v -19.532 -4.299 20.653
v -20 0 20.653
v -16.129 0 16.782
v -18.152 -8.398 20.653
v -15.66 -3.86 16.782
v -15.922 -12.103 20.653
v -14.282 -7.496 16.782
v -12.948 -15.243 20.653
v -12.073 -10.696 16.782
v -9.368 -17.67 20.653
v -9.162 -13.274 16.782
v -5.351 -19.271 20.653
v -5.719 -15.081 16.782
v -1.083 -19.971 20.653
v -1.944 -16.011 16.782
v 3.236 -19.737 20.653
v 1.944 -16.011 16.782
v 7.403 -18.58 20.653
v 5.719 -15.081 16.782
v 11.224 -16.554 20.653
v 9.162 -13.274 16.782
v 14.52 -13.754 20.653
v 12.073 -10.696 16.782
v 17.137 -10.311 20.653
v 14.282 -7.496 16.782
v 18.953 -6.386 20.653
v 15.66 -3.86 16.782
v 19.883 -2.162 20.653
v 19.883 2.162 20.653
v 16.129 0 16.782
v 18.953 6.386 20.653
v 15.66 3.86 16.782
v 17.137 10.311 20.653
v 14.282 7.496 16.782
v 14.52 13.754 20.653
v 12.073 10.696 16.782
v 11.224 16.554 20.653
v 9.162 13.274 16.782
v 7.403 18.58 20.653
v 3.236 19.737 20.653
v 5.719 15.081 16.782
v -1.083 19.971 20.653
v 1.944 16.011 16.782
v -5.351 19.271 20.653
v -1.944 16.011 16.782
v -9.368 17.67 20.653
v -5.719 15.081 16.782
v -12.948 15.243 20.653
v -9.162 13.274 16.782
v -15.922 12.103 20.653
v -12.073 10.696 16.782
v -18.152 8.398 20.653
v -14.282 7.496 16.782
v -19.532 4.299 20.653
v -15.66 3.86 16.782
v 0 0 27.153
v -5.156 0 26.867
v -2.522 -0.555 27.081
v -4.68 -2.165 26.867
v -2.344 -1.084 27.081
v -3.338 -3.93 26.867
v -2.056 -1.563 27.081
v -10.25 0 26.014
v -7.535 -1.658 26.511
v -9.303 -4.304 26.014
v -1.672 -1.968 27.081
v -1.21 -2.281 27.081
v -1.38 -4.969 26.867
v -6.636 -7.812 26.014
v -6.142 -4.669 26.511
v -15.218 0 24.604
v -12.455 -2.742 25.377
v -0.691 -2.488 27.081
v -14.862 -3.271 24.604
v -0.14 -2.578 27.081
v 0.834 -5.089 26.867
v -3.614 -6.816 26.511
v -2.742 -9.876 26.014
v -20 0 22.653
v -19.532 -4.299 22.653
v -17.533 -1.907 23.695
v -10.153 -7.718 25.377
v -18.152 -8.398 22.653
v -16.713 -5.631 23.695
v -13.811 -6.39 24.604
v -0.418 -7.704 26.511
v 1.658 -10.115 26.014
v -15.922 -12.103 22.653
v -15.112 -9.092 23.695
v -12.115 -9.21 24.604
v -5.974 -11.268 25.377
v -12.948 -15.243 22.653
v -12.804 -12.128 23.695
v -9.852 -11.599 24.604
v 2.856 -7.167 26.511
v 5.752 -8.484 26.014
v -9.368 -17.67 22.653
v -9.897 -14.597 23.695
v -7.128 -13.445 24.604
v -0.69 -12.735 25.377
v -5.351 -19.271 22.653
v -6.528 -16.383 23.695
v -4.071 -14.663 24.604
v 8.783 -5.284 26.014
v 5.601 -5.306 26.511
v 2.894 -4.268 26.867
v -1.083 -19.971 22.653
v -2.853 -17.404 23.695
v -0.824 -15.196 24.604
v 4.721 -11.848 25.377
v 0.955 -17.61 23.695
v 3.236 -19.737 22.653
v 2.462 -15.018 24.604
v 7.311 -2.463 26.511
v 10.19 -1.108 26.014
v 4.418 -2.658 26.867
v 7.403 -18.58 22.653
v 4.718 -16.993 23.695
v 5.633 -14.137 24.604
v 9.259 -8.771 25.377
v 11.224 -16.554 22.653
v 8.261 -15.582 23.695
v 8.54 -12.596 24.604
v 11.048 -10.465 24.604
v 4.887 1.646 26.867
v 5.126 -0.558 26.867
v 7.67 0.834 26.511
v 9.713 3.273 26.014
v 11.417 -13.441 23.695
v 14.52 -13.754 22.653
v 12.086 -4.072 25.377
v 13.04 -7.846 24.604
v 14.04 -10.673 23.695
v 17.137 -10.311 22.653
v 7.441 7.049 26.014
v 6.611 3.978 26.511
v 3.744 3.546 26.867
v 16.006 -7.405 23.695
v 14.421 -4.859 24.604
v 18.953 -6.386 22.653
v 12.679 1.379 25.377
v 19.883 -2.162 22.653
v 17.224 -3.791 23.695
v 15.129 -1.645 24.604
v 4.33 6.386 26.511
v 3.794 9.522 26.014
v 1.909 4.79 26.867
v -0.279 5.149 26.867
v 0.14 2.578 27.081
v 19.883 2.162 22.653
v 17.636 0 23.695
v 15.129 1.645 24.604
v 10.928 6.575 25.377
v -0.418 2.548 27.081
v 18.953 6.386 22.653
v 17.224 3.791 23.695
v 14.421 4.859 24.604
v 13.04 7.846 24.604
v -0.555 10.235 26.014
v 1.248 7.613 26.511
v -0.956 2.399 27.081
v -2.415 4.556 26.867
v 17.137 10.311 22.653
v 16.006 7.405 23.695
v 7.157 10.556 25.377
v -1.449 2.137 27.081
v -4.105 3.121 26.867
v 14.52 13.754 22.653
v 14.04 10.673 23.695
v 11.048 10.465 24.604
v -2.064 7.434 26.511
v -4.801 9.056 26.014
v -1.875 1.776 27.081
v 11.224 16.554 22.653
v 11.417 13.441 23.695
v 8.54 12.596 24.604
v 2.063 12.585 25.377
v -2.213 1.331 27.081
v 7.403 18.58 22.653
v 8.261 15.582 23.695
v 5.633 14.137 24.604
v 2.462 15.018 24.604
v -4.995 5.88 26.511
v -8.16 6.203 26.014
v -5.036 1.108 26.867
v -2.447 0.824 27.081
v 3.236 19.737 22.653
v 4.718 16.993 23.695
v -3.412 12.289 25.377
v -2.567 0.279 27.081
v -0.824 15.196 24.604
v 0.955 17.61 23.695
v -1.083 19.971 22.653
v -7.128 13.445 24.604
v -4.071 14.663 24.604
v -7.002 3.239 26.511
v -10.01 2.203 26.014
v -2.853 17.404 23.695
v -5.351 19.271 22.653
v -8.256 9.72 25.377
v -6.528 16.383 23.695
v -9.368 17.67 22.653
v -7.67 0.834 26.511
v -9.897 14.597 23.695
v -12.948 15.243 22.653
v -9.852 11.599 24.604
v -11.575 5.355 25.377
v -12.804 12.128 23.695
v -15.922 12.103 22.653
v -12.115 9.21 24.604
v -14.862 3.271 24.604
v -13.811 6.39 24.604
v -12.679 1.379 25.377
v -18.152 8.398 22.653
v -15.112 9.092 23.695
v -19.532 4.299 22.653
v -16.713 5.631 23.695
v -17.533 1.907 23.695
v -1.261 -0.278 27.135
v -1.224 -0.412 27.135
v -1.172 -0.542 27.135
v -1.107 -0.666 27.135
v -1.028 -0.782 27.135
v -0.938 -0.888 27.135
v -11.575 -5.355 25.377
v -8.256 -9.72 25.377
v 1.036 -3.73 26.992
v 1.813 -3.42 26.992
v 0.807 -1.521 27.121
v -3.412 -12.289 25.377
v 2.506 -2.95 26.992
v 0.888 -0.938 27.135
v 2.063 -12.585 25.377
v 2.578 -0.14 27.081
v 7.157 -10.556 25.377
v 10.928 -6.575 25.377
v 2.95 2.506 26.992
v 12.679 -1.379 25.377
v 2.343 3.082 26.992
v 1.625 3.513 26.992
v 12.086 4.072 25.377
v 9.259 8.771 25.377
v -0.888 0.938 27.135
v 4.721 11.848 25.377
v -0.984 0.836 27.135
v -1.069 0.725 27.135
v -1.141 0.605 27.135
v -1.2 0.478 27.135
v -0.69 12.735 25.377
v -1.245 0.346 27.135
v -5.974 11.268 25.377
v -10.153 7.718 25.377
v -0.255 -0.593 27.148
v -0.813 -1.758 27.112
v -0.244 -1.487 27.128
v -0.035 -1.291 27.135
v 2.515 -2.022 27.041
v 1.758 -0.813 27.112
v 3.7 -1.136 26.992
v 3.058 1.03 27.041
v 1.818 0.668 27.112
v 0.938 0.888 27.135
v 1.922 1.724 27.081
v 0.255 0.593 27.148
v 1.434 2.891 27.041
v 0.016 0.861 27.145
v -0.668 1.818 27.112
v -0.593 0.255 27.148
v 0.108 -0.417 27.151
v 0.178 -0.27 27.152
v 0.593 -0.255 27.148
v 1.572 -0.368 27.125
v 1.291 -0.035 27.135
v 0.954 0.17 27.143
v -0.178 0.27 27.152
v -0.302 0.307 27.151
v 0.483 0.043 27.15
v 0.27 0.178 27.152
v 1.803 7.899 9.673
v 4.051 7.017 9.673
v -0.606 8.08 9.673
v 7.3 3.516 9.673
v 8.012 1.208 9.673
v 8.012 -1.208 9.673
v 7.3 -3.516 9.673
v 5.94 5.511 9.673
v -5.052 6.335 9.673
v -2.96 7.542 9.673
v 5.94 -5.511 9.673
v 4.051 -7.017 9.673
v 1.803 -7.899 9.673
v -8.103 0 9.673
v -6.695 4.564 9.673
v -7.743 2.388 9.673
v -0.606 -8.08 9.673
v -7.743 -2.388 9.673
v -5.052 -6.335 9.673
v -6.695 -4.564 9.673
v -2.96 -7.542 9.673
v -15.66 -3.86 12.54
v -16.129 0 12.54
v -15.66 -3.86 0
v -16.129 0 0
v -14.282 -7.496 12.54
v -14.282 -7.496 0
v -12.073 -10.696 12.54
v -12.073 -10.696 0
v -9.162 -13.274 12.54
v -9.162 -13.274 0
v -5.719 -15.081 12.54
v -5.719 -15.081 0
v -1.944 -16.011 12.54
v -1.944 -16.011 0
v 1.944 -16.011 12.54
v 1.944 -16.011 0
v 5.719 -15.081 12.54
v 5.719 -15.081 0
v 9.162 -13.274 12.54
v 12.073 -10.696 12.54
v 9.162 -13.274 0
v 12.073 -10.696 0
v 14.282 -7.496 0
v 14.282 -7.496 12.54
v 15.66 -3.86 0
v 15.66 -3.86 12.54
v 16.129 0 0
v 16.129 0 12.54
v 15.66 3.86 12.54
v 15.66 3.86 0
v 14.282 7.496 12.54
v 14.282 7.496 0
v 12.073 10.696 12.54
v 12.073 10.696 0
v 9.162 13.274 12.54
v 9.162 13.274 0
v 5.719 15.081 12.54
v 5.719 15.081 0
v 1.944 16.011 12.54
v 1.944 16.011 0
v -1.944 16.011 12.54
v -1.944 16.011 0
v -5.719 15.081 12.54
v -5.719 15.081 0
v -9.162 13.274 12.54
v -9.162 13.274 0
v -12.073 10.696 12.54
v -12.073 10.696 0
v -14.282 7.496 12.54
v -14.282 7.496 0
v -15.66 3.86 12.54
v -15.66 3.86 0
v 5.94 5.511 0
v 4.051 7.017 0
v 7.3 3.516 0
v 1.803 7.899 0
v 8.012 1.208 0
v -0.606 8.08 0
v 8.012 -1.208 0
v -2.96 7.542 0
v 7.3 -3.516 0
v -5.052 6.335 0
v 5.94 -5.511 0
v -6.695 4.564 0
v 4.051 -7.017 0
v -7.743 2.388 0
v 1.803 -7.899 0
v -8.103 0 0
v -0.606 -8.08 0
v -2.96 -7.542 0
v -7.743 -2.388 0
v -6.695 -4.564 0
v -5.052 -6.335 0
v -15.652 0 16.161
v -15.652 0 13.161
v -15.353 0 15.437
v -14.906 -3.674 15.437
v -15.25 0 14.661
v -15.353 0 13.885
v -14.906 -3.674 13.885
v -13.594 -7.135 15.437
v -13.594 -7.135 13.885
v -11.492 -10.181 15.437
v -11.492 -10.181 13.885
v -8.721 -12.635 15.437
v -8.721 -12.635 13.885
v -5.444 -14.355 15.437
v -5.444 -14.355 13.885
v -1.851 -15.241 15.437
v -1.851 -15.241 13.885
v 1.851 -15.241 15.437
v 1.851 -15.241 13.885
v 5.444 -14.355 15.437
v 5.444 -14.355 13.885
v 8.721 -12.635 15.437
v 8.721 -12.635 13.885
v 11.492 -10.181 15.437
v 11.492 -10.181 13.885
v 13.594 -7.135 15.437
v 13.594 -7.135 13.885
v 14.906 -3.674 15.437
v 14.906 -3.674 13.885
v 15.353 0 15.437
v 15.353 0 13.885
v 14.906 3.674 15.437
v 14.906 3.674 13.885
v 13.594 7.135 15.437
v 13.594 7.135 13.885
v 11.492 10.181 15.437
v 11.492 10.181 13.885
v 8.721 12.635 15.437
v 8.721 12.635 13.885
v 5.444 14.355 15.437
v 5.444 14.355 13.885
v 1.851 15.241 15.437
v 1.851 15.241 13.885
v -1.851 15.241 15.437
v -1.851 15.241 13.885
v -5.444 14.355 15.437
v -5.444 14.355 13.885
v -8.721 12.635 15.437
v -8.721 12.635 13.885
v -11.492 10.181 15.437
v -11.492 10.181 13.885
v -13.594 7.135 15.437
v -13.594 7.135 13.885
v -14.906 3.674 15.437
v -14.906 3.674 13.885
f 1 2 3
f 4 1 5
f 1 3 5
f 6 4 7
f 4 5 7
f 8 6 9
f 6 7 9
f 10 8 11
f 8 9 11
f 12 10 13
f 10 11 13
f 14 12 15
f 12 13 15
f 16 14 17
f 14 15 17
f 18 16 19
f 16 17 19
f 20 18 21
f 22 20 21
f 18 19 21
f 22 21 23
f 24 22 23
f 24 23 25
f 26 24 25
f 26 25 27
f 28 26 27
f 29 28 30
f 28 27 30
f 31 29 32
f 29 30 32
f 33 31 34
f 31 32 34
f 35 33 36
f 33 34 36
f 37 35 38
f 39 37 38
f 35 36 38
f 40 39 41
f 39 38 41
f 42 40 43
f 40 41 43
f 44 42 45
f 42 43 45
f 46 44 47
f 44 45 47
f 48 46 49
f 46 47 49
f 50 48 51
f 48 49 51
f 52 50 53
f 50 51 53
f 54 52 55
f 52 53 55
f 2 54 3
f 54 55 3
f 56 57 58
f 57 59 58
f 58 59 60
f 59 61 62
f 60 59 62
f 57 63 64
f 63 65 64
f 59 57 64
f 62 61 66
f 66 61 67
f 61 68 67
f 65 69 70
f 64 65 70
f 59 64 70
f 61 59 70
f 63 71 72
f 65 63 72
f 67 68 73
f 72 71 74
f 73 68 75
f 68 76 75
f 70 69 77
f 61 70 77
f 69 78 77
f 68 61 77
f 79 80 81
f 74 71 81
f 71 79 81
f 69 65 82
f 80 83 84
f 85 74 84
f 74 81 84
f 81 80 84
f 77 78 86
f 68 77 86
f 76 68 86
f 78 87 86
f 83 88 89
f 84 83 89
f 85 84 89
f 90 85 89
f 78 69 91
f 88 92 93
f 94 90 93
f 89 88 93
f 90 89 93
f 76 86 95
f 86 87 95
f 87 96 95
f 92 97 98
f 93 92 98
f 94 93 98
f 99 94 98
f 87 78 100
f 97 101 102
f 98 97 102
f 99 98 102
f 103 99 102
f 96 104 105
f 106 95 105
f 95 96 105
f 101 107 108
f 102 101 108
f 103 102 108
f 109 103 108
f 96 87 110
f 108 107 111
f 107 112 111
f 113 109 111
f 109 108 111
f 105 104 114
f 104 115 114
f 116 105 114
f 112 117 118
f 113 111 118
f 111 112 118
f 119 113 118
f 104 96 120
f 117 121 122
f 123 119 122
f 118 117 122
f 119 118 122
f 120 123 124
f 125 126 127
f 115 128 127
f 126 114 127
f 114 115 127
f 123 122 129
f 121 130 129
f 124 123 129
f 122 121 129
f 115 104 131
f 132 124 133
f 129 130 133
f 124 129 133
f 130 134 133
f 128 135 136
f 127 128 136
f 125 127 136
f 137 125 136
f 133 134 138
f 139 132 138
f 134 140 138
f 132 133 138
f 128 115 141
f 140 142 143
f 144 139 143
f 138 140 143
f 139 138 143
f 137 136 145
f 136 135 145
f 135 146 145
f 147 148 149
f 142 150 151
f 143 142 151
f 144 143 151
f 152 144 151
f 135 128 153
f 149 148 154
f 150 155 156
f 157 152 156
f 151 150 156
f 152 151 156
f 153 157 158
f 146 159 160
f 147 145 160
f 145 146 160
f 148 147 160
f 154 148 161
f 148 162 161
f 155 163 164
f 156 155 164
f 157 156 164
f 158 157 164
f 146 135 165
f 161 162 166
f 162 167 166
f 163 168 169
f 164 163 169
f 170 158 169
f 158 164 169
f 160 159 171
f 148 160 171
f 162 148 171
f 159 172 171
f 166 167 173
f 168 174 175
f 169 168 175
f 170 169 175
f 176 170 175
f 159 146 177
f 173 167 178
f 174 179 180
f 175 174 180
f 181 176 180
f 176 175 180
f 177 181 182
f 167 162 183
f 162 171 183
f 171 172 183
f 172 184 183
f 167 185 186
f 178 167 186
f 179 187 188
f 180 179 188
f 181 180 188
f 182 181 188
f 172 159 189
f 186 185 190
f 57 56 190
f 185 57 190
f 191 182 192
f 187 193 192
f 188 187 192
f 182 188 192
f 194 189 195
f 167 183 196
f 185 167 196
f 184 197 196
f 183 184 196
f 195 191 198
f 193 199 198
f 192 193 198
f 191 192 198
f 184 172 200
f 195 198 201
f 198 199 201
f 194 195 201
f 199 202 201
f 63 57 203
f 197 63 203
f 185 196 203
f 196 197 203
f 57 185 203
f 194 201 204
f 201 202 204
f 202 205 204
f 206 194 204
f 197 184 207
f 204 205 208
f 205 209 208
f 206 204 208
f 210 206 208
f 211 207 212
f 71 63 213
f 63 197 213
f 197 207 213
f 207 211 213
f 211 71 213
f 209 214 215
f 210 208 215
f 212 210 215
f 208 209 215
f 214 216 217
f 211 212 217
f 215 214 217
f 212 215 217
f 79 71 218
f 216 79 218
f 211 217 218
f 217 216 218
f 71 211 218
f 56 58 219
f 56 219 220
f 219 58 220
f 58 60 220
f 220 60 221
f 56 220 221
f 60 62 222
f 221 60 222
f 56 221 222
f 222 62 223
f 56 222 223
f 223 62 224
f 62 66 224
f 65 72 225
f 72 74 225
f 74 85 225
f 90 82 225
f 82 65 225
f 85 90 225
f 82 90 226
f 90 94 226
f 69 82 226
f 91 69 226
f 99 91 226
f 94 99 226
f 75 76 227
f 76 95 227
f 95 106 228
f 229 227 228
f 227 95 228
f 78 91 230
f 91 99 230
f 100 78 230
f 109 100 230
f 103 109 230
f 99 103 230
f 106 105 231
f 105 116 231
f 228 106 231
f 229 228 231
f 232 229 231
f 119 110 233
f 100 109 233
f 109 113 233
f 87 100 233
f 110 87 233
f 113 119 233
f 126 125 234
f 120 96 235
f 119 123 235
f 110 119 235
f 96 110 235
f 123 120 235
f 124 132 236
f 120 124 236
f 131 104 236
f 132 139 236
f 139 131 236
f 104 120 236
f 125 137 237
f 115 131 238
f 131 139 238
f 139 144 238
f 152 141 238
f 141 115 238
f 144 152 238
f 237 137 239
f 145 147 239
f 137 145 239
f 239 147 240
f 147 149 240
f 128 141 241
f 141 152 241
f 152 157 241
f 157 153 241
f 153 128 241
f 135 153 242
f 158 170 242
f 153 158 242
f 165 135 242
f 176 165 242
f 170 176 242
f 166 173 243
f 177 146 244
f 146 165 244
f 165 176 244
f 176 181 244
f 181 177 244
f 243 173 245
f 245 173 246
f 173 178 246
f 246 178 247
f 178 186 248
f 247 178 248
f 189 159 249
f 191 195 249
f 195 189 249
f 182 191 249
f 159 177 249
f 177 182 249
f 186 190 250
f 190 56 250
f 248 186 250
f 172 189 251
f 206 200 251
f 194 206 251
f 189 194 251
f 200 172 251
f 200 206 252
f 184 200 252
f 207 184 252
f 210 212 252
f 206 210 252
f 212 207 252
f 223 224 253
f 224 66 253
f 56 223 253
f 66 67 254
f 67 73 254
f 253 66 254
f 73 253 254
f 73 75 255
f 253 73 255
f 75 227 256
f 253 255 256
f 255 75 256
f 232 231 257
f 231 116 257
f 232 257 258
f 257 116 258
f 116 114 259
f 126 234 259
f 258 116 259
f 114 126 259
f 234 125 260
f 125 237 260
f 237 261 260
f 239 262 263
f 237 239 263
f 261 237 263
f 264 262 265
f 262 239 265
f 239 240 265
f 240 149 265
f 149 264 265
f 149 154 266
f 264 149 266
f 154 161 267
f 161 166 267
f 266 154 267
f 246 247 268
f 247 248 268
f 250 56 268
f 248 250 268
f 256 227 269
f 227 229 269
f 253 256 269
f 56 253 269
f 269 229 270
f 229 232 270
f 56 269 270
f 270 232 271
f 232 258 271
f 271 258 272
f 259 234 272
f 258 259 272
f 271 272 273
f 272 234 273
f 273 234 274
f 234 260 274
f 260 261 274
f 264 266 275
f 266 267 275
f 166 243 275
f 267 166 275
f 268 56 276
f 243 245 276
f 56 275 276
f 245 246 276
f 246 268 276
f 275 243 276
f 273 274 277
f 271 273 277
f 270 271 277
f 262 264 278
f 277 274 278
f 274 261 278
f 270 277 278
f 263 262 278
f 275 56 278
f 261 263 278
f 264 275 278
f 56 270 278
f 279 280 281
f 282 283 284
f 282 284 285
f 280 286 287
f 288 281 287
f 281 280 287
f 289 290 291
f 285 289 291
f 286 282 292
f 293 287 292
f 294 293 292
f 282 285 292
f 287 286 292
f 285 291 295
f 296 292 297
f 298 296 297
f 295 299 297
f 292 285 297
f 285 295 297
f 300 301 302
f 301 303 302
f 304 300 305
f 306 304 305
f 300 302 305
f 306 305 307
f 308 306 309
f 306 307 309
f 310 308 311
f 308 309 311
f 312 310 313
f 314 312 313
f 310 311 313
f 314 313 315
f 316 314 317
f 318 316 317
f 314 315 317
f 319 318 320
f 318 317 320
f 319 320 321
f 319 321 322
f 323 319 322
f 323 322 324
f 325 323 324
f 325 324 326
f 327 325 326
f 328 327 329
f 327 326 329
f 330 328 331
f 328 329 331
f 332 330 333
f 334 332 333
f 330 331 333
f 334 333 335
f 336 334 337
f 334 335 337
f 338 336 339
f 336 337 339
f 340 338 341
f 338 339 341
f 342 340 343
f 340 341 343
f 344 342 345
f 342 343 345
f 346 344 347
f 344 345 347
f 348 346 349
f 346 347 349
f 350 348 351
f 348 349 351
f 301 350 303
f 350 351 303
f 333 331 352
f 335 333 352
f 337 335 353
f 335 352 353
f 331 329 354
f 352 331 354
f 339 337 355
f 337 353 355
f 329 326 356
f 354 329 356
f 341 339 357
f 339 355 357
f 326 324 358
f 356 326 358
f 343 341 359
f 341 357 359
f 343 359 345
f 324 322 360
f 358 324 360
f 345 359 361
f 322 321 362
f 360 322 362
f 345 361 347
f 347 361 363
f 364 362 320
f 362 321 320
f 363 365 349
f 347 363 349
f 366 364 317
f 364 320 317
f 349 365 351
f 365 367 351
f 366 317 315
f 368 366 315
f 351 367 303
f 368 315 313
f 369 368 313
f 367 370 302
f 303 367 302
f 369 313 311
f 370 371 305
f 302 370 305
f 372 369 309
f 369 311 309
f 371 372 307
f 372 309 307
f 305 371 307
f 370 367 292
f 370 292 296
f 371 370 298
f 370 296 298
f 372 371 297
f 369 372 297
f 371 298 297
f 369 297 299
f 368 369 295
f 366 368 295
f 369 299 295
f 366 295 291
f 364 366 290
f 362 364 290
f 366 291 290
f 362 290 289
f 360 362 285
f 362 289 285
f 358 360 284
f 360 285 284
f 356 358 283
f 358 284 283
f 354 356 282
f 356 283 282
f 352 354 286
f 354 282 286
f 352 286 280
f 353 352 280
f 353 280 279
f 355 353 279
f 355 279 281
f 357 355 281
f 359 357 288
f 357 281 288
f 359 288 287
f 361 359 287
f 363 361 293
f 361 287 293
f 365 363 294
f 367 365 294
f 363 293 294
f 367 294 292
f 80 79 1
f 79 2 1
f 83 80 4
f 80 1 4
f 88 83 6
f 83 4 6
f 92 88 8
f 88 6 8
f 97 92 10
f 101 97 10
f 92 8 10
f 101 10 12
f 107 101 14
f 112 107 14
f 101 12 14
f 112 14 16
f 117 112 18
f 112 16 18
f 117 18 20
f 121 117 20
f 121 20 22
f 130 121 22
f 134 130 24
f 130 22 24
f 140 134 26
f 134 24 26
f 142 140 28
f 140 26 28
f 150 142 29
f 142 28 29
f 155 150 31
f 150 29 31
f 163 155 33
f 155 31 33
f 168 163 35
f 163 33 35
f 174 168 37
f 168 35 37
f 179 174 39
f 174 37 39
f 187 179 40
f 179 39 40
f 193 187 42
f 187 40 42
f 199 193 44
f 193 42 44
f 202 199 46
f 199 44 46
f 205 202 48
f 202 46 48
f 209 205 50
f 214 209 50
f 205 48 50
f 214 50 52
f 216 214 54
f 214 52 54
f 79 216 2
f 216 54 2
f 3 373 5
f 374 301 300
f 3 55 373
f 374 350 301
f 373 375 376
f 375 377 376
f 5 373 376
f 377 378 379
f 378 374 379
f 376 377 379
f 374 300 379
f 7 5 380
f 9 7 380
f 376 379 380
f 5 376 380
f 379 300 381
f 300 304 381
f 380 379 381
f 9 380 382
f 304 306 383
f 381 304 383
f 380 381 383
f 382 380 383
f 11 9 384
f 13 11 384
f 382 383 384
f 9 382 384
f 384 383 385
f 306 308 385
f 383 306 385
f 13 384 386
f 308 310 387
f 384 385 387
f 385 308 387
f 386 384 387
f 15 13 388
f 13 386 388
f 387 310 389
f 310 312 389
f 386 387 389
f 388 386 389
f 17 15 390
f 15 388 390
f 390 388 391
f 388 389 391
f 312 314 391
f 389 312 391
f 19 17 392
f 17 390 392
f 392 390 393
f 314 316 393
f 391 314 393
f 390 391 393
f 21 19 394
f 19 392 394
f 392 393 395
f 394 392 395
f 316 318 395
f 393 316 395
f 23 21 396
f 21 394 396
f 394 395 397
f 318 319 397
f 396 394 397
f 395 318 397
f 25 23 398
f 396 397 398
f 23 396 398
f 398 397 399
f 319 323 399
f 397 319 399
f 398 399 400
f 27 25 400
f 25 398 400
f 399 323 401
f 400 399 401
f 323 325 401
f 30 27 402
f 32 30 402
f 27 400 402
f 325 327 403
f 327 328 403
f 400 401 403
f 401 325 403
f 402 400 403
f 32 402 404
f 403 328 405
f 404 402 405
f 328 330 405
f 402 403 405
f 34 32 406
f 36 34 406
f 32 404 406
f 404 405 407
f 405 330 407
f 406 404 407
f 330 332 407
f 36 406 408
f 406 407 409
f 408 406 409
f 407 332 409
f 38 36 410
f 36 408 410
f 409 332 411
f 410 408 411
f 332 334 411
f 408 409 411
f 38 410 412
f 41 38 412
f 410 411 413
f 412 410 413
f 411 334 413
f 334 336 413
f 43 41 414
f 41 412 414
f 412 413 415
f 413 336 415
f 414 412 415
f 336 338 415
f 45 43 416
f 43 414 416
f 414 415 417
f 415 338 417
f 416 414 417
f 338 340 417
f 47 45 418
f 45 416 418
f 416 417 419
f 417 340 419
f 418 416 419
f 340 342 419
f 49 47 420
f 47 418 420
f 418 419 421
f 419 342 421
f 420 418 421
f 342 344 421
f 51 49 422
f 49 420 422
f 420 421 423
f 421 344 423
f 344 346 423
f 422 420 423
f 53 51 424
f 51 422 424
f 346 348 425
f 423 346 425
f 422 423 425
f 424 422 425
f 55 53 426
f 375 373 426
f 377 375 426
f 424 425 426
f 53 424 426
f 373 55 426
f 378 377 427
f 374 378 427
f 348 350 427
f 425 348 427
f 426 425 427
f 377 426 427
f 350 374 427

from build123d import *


with BuildPart() as f1:
    # F0 (on Front) → F1 (revolve)
    with BuildSketch(Plane.XZ):
        with BuildLine():
            Line((-8.1026, 9.672707), (0, 9.672707))
            Line((0, 9.672707), (0, 27.15264))
            ThreePointArc((0, 27.15264), (-10.249929, 26.01392), (-20, 22.65329))
            Line((-20, 22.65329), (-20, 20.65329))
            Line((-20, 20.65329), (-16.129, 16.78229))
            ThreePointArc((-16.129, 16.78229), (-15.25032, 14.66097), (-16.129, 12.539649))
            Line((-16.129, 12.539649), (-16.129, 0))
            Line((-16.129, 0), (-8.1026, 0))
            Line((-8.1026, 0), (-8.1026, 9.672707))
        make_face()
    revolve(axis=Axis((0, 0, 16.521212), (0, 0, 1)))


solid = f1.part
